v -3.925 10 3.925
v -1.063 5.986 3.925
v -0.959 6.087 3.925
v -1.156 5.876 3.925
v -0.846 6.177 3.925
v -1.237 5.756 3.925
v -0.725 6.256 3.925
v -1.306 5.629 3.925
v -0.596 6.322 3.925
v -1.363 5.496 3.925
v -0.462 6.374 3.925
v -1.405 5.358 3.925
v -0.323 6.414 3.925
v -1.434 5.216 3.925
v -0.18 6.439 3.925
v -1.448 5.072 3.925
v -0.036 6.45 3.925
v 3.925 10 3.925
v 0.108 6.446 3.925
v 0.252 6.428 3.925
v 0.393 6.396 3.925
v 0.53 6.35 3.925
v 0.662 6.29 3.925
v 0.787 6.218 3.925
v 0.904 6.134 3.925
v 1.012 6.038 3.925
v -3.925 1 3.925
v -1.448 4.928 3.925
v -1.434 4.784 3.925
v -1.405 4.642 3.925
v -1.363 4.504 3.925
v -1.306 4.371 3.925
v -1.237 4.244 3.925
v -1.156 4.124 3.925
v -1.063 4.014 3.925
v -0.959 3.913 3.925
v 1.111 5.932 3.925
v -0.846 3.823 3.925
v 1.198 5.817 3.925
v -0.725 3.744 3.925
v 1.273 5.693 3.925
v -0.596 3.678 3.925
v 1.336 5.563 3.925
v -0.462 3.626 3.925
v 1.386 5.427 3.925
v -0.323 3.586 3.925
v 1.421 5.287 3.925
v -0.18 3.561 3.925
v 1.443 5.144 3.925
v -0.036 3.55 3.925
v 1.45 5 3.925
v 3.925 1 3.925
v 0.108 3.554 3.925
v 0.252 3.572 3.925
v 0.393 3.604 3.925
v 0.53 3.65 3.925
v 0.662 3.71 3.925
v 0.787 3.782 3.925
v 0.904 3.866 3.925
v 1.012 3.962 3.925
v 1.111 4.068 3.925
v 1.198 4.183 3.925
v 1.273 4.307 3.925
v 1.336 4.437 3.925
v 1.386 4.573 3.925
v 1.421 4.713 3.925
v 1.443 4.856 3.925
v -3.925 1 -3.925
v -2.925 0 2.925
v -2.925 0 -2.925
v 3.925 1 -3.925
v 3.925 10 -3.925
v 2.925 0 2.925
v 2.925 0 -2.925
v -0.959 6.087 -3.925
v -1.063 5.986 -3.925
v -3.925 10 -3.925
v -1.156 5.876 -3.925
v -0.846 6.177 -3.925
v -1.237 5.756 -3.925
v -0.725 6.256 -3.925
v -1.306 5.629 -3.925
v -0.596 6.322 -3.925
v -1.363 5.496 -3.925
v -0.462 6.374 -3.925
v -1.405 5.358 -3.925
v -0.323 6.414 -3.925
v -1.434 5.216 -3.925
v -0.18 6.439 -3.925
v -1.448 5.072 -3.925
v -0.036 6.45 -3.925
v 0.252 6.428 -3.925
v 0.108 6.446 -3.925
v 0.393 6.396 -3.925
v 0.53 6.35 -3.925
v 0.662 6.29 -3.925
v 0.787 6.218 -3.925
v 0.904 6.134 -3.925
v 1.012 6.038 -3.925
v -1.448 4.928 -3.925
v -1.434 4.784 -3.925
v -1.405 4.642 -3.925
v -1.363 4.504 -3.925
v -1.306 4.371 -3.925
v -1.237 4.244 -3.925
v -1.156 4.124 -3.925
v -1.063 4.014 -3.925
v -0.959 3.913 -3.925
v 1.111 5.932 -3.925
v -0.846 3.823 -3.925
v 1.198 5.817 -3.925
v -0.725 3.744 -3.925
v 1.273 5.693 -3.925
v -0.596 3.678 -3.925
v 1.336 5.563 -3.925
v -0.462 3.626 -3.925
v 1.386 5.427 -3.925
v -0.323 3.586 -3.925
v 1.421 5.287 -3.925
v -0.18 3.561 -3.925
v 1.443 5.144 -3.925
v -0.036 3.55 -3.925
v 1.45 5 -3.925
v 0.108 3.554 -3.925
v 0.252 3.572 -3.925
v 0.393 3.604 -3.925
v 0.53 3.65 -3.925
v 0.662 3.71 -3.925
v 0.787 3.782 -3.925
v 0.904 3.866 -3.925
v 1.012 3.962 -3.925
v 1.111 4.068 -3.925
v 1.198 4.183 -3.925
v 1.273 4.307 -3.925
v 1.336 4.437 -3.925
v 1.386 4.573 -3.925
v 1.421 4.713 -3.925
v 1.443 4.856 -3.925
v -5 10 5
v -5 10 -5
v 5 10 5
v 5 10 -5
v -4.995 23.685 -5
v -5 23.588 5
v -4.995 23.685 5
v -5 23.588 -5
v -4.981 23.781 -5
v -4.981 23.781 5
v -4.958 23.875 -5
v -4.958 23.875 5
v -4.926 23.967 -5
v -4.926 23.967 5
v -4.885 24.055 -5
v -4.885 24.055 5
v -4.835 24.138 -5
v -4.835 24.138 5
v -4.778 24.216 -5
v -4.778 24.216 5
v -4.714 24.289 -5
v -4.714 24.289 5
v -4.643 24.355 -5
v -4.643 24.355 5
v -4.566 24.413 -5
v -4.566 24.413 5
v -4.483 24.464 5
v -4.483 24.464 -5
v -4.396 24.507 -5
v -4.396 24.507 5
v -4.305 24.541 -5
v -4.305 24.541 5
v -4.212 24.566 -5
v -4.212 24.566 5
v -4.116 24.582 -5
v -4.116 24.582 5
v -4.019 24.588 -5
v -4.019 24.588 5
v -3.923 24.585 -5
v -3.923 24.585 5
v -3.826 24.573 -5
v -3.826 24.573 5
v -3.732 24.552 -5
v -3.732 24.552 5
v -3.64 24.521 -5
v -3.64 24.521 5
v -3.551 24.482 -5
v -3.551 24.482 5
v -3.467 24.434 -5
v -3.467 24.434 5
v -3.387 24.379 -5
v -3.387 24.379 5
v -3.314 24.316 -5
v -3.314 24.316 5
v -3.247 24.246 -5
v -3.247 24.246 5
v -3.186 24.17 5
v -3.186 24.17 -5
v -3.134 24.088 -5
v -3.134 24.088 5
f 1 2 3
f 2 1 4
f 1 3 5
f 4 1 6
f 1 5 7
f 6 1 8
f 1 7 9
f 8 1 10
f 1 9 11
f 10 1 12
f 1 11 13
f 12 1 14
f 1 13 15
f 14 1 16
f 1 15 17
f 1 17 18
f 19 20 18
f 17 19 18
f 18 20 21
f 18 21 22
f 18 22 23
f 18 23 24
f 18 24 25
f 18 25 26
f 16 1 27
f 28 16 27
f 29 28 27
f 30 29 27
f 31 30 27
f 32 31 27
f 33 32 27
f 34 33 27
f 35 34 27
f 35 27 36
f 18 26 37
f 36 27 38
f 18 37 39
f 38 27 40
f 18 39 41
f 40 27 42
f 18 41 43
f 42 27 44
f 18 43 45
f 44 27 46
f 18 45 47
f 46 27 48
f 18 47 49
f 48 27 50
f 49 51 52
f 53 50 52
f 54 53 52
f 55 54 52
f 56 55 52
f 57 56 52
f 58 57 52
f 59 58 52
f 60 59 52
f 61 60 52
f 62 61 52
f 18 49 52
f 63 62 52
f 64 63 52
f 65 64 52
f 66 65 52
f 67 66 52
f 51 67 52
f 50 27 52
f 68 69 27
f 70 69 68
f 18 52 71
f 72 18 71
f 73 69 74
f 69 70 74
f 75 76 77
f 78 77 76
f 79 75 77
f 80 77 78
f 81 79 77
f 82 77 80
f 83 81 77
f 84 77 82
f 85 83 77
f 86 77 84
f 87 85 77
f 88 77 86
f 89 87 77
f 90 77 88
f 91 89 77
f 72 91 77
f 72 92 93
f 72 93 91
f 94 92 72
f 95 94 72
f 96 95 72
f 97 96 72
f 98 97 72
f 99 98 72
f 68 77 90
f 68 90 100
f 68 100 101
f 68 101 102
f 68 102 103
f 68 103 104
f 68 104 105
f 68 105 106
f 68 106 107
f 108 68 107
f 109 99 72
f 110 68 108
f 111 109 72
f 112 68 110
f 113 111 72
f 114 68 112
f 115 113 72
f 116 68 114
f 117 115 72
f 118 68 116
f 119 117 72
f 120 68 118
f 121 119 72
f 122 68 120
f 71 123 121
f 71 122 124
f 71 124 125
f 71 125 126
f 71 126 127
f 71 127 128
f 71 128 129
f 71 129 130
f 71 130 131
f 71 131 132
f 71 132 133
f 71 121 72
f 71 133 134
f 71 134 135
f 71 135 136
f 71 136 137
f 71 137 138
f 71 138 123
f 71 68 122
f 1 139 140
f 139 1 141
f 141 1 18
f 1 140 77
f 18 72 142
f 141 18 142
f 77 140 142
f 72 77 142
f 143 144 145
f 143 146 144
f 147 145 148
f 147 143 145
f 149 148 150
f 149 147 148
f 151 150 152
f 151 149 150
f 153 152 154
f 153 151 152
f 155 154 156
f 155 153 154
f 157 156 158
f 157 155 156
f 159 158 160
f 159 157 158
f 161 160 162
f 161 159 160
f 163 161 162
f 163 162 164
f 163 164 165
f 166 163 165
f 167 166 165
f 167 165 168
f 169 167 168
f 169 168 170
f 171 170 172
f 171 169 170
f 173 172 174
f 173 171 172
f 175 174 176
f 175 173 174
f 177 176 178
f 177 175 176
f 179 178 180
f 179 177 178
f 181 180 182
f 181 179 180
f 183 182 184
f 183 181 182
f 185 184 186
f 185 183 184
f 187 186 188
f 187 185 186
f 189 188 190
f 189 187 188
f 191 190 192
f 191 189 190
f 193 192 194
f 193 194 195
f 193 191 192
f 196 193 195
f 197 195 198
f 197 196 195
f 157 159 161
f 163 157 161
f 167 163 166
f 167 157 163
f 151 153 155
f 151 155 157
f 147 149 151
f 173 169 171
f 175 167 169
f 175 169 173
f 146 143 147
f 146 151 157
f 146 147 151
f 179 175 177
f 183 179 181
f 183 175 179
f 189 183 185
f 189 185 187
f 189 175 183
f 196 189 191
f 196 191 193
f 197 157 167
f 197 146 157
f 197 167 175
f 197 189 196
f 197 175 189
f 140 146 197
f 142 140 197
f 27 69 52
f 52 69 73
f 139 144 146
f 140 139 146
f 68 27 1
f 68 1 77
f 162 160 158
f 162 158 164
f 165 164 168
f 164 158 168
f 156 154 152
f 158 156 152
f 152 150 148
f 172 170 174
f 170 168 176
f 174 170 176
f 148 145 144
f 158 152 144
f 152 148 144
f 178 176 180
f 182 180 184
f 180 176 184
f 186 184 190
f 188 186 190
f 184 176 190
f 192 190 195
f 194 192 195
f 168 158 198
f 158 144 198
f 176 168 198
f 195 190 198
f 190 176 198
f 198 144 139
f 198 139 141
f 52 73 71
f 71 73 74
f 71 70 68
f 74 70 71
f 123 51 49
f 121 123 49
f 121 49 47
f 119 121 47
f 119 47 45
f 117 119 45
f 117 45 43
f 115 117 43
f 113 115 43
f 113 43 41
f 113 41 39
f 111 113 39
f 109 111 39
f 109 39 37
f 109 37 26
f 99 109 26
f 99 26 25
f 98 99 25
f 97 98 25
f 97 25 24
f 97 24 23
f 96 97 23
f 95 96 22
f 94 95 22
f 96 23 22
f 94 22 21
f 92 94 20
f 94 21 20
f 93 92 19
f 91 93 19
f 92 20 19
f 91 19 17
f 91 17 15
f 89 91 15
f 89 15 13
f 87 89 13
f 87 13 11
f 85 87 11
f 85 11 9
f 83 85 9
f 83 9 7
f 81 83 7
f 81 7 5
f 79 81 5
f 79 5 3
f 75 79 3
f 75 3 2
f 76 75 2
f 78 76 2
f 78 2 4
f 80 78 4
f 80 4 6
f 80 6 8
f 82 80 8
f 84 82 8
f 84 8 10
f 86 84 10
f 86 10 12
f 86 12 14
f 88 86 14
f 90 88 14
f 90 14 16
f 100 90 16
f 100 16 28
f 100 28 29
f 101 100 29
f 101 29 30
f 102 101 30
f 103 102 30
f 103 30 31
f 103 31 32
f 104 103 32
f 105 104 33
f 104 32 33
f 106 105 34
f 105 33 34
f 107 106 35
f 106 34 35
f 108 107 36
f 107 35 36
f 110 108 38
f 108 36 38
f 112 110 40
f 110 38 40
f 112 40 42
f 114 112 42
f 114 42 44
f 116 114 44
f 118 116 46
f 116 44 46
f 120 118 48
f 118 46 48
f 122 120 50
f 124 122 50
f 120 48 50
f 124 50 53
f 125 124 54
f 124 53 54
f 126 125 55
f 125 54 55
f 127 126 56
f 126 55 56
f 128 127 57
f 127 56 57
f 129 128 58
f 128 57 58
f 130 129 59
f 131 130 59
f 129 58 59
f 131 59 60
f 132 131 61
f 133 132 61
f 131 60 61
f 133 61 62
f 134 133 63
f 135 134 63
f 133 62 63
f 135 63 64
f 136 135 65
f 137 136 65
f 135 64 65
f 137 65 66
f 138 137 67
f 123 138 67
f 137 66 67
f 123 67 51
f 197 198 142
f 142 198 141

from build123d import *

# Parameters (mm, degrees)
SKETCH_1_W          = 7.85
SKETCH_1_H          = 7.85
EXTRUDE_1_DEPTH     = 10
SKETCH_2_W          = 10
SKETCH_2_H          = 10
EXTRUDE_2_DEPTH     = 30
CUT_EXTRUDE_1_DEPTH = 30
FILLET_1_R          = 1
CHAMFER_1_SIZE      = 1
SKETCH_4_R          = 1.45
CUT_EXTRUDE_2_DEPTH = 30


with BuildPart() as part:
    # ｽｹｯﾁ1 → ﾎﾞｽ - 押し出し1 (new body)
    with BuildSketch(Plane(origin=(0, 0, 0), x_dir=(1, 0, 0), z_dir=(0, 1, 0))):
        Rectangle(SKETCH_1_W, SKETCH_1_H)
    extrude(amount=EXTRUDE_1_DEPTH)

    # ｽｹｯﾁ2 → ﾎﾞｽ - 押し出し2 (add)
    with BuildSketch(Plane(origin=(0, 10, 0), x_dir=(1, 0, 0), z_dir=(0, 1, 0))):
        Rectangle(SKETCH_2_W, SKETCH_2_H)
    extrude(amount=EXTRUDE_2_DEPTH)

    # ｽｹｯﾁ3 → ｶｯﾄ - 押し出し1 (cut)
    with BuildSketch(Plane.XY.offset(5)):
        Polygon((-5, 27.320508076), (5, 10), (5, 40), (-5, 40), align=None)
    extrude(amount=-CUT_EXTRUDE_1_DEPTH, mode=Mode.SUBTRACT)

    # ﾌｨﾚｯﾄ1
    fillet_1_edges = [part.edges().sort_by_distance(p)[0] for p in [
        (-5, 27.320508076, 0),
    ]]
    fillet(fillet_1_edges, radius=FILLET_1_R)

    # 面取り1
    chamfer_1_edges = [part.edges().sort_by_distance(p)[0] for p in [
        (0, 0, 3.925),
        (-3.925, 0, 0),
        (0, 0, -3.925),
        (3.925, 0, 0),
    ]]
    chamfer(chamfer_1_edges, length=CHAMFER_1_SIZE)

    # ｽｹｯﾁ4 → ｶｯﾄ - 押し出し2 (cut)
    with BuildSketch(Plane.XY.offset(3.925)):
        with Locations((0, 5)):
            Circle(SKETCH_4_R)
    extrude(amount=-CUT_EXTRUDE_2_DEPTH, mode=Mode.SUBTRACT)


solid = part.part
